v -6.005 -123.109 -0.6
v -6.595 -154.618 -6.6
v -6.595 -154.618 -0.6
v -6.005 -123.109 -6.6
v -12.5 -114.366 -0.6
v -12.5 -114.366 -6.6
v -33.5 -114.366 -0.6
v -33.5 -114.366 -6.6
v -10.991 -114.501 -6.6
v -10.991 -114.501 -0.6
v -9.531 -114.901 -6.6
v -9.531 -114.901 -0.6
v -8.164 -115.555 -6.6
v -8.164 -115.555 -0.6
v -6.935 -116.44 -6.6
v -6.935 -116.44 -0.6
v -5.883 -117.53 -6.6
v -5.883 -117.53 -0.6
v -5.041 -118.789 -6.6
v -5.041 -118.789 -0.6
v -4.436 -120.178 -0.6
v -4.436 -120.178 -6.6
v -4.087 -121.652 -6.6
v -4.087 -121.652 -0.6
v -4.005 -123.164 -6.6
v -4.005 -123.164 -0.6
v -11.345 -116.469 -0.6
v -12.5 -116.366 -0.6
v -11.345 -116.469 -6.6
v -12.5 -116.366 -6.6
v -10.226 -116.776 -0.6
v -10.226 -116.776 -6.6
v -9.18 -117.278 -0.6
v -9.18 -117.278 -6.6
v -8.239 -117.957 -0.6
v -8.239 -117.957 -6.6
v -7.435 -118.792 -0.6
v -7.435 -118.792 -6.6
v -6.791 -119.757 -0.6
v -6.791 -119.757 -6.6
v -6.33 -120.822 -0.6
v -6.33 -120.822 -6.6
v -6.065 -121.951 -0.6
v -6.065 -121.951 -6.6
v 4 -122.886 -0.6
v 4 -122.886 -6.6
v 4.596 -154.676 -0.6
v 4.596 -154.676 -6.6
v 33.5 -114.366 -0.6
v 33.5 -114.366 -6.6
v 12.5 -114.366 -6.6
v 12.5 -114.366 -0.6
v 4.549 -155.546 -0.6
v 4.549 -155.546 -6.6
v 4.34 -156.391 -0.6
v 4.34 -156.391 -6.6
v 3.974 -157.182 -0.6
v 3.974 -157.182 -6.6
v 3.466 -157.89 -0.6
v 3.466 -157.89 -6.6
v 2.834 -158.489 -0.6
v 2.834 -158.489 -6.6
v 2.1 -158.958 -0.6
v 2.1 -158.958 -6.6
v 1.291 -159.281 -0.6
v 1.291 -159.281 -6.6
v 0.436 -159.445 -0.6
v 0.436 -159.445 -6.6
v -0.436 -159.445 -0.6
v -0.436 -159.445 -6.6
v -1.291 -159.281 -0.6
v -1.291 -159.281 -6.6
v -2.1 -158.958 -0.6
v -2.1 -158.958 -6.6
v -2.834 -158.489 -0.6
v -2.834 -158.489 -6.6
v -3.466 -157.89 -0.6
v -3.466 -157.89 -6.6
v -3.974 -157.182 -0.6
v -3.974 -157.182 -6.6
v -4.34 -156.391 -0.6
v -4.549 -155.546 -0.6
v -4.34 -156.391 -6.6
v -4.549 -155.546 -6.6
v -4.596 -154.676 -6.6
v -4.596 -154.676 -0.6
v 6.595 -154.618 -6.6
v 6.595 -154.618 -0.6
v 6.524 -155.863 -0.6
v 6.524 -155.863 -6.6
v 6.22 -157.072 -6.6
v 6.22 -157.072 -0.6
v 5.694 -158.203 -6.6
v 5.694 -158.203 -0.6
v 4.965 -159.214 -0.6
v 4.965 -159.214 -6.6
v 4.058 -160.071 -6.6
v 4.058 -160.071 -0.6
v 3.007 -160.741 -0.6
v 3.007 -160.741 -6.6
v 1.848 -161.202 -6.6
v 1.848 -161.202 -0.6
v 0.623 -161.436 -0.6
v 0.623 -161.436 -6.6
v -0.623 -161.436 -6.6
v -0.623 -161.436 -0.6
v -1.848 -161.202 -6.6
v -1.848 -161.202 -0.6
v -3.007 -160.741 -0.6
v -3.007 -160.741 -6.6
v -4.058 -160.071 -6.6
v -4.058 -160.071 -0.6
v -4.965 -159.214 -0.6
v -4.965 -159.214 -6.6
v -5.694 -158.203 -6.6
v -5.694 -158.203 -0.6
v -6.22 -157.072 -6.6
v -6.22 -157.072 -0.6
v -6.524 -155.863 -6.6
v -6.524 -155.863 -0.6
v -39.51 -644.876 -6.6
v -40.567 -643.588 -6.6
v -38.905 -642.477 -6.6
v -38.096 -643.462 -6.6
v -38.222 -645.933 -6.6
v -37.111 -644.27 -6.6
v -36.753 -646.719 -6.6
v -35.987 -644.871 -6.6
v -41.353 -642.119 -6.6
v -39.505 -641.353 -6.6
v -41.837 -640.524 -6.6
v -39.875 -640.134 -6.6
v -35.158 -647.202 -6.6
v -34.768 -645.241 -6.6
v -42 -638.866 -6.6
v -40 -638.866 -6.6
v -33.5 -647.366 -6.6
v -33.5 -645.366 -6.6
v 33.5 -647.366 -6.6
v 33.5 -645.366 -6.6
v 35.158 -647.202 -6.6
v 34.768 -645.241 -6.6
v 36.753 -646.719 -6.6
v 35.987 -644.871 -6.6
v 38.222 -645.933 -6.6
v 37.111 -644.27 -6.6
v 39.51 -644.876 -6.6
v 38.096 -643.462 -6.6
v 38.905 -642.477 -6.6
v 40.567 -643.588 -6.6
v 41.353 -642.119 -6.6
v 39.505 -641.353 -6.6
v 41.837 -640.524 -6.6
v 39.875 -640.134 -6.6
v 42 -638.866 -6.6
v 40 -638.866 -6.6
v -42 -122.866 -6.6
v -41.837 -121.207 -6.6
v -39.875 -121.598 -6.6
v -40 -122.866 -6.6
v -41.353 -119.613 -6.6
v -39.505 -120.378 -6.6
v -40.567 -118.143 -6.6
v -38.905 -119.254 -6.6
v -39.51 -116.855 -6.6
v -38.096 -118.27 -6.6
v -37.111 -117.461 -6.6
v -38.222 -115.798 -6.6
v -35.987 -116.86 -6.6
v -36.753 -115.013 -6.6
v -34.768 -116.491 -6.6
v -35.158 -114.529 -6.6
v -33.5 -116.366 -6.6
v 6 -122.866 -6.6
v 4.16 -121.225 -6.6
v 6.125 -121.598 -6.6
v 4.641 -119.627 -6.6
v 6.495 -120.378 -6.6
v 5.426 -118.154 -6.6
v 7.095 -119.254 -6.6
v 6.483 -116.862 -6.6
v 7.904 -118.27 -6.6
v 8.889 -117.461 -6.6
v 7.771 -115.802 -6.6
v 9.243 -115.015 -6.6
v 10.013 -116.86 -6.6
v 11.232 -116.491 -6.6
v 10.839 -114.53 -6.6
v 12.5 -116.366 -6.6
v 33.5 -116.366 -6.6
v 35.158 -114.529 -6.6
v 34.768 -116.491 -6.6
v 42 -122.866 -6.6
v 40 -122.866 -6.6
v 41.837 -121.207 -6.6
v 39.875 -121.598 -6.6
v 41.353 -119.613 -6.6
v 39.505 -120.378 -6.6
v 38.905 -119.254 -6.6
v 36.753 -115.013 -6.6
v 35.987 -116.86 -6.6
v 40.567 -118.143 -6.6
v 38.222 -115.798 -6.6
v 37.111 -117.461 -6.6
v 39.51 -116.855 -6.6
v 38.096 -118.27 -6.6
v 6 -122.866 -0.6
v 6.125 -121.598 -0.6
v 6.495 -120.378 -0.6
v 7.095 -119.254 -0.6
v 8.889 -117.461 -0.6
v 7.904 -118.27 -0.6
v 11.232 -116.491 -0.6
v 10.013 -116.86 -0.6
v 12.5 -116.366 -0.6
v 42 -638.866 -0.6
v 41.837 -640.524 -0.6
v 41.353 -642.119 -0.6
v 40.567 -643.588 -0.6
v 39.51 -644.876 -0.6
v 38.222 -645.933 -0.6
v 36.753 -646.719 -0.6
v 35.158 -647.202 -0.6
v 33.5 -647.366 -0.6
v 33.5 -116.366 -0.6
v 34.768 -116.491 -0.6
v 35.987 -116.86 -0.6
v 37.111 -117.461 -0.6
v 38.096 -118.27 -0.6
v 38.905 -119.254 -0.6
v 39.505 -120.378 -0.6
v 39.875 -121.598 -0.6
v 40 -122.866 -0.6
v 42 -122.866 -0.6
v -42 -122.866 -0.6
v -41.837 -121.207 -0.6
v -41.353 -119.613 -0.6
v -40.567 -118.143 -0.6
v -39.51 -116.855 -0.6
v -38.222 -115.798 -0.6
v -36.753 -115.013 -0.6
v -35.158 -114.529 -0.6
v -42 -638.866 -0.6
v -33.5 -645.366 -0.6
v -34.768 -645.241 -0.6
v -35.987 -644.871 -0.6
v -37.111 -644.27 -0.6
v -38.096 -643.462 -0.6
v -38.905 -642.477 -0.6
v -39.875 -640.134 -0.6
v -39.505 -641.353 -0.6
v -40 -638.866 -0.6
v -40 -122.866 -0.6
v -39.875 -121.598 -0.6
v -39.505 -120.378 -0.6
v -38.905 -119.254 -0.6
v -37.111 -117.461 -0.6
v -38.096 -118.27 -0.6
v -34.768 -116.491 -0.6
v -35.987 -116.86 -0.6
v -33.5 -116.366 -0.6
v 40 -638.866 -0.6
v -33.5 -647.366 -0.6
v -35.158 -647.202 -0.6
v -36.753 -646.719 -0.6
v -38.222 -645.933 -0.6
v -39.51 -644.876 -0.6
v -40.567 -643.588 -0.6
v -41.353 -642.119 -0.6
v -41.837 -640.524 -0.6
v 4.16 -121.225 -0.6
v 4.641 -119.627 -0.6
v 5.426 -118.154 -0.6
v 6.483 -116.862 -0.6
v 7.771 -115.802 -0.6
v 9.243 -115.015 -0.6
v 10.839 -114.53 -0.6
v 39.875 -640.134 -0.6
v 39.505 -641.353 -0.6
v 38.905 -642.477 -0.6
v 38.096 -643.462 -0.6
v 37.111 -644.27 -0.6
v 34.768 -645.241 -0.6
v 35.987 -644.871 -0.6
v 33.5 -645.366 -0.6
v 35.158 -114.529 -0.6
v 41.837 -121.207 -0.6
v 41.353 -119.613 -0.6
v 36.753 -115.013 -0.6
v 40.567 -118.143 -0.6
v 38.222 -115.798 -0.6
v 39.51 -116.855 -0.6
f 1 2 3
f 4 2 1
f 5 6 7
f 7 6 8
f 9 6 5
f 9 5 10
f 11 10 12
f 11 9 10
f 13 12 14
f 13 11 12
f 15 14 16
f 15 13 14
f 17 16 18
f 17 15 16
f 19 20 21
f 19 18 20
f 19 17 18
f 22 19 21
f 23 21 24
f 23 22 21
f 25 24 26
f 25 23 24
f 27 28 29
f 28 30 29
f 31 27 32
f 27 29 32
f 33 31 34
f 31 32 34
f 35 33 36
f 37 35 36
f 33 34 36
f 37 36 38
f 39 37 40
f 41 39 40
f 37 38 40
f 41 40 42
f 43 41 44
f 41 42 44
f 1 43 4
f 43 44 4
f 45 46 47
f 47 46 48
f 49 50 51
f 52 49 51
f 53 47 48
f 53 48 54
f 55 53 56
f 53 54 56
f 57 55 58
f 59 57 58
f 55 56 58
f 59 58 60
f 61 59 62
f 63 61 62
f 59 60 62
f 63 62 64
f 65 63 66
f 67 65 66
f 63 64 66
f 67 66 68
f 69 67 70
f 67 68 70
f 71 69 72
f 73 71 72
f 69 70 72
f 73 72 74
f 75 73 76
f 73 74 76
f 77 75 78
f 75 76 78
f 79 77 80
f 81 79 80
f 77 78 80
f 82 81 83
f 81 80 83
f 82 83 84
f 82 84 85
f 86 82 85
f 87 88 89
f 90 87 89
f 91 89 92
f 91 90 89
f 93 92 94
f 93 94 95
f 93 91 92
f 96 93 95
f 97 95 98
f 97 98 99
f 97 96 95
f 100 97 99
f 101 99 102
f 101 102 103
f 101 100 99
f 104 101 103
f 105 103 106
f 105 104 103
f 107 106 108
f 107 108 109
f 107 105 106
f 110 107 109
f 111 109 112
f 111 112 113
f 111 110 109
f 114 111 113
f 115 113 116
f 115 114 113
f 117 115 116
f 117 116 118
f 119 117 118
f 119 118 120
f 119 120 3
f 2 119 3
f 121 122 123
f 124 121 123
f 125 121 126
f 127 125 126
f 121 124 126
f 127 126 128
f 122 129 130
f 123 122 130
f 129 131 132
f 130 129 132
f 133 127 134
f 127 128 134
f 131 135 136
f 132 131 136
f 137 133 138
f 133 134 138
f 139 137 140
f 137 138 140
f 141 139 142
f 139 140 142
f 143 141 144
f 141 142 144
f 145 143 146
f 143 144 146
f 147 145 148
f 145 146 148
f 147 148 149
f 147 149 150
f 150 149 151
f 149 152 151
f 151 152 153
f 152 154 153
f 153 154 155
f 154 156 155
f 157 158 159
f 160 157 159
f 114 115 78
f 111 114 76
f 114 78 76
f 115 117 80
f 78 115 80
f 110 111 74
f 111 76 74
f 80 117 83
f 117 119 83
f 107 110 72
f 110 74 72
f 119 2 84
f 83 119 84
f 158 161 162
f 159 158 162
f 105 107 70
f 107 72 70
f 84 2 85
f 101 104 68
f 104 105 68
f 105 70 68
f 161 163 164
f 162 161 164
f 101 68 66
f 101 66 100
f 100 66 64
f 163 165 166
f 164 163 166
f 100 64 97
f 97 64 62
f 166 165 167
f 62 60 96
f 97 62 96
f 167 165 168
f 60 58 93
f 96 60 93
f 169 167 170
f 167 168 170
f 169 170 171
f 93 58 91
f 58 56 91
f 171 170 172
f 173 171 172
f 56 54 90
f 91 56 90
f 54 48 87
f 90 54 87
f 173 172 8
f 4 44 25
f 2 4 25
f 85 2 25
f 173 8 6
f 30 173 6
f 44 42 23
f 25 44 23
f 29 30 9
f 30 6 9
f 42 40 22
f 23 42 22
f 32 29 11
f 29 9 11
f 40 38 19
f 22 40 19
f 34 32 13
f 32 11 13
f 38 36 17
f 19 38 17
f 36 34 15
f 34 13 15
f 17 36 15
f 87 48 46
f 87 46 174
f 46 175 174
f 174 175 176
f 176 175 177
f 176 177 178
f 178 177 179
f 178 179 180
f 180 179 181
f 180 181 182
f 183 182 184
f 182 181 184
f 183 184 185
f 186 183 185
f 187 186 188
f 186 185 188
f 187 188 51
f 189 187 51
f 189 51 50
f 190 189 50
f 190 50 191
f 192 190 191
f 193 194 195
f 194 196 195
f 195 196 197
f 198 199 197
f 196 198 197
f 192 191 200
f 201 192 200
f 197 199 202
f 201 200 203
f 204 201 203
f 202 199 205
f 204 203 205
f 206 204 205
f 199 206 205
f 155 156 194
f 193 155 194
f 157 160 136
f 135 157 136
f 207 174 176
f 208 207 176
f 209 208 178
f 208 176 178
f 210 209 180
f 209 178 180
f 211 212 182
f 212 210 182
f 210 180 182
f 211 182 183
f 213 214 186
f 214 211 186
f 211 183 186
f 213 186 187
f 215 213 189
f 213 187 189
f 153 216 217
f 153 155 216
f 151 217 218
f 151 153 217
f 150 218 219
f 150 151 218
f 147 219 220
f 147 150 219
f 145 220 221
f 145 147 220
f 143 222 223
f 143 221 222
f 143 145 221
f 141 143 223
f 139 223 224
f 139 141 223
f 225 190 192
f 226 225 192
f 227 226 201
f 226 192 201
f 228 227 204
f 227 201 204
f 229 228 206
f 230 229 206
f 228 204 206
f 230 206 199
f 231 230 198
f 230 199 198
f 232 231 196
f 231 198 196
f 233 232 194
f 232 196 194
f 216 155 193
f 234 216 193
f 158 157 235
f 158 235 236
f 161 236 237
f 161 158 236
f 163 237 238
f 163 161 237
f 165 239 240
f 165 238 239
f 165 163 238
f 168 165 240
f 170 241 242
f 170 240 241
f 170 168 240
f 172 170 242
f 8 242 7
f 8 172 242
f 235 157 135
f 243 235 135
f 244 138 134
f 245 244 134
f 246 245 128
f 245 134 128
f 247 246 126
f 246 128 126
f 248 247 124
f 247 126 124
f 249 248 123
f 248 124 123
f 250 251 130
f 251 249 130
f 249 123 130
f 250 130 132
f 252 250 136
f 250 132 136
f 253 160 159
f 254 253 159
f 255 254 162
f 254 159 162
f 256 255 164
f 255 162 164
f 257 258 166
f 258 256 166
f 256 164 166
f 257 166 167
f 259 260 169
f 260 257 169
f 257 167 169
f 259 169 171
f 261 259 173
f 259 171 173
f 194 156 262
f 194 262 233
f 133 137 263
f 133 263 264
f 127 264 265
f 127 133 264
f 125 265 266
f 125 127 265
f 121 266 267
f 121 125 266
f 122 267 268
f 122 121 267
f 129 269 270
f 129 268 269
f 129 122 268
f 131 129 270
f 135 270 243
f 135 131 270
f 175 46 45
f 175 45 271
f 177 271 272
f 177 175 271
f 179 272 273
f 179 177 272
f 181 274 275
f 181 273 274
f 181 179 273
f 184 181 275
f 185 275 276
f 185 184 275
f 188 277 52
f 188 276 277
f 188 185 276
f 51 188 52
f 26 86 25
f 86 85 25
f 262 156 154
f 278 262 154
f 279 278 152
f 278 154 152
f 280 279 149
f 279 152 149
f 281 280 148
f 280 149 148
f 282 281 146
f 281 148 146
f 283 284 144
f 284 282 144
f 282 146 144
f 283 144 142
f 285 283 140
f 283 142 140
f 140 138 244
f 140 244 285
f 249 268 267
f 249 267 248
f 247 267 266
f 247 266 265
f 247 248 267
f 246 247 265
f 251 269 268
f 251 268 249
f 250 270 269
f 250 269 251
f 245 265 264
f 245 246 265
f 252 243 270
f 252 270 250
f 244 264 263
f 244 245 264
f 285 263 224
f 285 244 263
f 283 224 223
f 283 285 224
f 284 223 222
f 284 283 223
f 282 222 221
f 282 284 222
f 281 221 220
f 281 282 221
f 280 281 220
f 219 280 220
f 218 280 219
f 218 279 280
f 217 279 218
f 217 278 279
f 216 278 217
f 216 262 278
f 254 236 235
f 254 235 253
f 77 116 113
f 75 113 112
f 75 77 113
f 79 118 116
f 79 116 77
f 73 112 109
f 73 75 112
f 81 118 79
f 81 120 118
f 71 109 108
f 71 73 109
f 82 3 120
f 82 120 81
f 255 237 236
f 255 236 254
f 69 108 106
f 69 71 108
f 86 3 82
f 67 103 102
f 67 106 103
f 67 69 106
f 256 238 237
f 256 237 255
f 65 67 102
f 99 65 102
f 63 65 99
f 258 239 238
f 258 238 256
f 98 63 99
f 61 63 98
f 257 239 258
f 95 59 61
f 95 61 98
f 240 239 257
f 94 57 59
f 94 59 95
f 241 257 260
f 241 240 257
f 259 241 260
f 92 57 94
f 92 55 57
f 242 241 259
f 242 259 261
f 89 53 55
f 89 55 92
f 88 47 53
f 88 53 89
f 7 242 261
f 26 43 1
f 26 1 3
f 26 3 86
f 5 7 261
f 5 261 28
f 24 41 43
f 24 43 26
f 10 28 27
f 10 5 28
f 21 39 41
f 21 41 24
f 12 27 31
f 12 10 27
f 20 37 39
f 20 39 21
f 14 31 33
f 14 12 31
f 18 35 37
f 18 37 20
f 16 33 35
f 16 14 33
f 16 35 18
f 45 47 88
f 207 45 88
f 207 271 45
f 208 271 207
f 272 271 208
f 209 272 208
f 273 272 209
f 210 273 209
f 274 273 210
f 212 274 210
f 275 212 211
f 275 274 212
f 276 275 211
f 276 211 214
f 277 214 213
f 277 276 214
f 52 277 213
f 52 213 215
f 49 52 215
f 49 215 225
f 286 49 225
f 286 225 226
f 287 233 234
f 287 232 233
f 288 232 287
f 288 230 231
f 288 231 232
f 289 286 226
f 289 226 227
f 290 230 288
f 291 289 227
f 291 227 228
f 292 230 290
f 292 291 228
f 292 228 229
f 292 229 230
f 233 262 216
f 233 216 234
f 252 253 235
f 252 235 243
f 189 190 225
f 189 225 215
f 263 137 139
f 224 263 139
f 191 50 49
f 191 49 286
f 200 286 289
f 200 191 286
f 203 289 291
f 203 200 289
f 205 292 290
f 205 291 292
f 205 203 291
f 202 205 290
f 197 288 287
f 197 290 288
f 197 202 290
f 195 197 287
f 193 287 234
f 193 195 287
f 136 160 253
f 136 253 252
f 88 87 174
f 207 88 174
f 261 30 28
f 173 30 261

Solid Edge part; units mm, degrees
sketch "Sketch1" plane through (0, 0, -6.6) normal (0, 0, 1) x (1, 0, 0)
  line L0 (-40, -122.8657) -> (-40, -638.8657)
  line L1 (-33.5, -645.3657) -> (33.5, -645.3657)
  line L2 (40, -638.8657) -> (40, -122.8657)
  line L3 (33.5, -116.3657) -> (12.5, -116.3657)
  line L4 (6.5954, -154.6183) -> (6, -122.8657)
  line L5 (-6.5954, -154.6183) -> (-6.0046, -123.1094)
  line L6 (-12.5, -116.3657) -> (-33.5, -116.3657)
  arc A0 (-40, -638.8657) -> (-33.5, -645.3657) centre (-33.5, -638.8657) ccw
  arc A1 (33.5, -645.3657) -> (40, -638.8657) centre (33.5, -638.8657) ccw
  arc A2 (33.5, -116.3657) -> (40, -122.8657) centre (33.5, -122.8657) cw
  arc A3 (12.5, -116.3657) -> (6, -122.8657) centre (12.5, -122.8657) ccw
  arc A4 (6.5954, -154.6183) -> (-6.5954, -154.6183) centre (0, -154.8657) cw
  arc A5 (-12.5, -116.3657) -> (-6.0046, -123.1094) centre (-12.5, -122.8657) cw
  arc A6 (-33.5, -116.3657) -> (-40, -122.8657) centre (-33.5, -122.8657) ccw
  line L7 (-42, -122.8657) -> (-42, -638.8657)
  arc A7 (-42, -638.8657) -> (-33.5, -647.3657) centre (-33.5, -638.8657) ccw
  line L8 (-33.5, -647.3657) -> (33.5, -647.3657)
  arc A8 (33.5, -647.3657) -> (42, -638.8657) centre (33.5, -638.8657) ccw
  line L9 (42, -638.8657) -> (42, -122.8657)
  arc A9 (42, -122.8657) -> (33.5, -114.3657) centre (33.5, -122.8657) ccw
  line L10 (33.5, -114.3657) -> (12.5, -114.3657)
  arc A10 (12.5, -114.3657) -> (4, -122.8857) centre (12.5, -122.8657) ccw
  line L11 (4, -122.8857) -> (4.5961, -154.6762)
  arc A11 (4.5961, -154.6762) -> (-4.5961, -154.6762) centre (0, -154.8657) cw
  line L12 (-4.5961, -154.6762) -> (-4.0052, -123.1644)
  arc A12 (-4.0052, -123.1644) -> (-12.5, -114.3657) centre (-12.5, -122.8657) ccw
  line L13 (-12.5, -114.3657) -> (-33.5, -114.3657)
  arc A13 (-33.5, -114.3657) -> (-42, -122.8657) centre (-33.5, -122.8657) ccw
extrude "Protrusion1" add sketch "Sketch1" along normal blind 6
properties material "PVC"
